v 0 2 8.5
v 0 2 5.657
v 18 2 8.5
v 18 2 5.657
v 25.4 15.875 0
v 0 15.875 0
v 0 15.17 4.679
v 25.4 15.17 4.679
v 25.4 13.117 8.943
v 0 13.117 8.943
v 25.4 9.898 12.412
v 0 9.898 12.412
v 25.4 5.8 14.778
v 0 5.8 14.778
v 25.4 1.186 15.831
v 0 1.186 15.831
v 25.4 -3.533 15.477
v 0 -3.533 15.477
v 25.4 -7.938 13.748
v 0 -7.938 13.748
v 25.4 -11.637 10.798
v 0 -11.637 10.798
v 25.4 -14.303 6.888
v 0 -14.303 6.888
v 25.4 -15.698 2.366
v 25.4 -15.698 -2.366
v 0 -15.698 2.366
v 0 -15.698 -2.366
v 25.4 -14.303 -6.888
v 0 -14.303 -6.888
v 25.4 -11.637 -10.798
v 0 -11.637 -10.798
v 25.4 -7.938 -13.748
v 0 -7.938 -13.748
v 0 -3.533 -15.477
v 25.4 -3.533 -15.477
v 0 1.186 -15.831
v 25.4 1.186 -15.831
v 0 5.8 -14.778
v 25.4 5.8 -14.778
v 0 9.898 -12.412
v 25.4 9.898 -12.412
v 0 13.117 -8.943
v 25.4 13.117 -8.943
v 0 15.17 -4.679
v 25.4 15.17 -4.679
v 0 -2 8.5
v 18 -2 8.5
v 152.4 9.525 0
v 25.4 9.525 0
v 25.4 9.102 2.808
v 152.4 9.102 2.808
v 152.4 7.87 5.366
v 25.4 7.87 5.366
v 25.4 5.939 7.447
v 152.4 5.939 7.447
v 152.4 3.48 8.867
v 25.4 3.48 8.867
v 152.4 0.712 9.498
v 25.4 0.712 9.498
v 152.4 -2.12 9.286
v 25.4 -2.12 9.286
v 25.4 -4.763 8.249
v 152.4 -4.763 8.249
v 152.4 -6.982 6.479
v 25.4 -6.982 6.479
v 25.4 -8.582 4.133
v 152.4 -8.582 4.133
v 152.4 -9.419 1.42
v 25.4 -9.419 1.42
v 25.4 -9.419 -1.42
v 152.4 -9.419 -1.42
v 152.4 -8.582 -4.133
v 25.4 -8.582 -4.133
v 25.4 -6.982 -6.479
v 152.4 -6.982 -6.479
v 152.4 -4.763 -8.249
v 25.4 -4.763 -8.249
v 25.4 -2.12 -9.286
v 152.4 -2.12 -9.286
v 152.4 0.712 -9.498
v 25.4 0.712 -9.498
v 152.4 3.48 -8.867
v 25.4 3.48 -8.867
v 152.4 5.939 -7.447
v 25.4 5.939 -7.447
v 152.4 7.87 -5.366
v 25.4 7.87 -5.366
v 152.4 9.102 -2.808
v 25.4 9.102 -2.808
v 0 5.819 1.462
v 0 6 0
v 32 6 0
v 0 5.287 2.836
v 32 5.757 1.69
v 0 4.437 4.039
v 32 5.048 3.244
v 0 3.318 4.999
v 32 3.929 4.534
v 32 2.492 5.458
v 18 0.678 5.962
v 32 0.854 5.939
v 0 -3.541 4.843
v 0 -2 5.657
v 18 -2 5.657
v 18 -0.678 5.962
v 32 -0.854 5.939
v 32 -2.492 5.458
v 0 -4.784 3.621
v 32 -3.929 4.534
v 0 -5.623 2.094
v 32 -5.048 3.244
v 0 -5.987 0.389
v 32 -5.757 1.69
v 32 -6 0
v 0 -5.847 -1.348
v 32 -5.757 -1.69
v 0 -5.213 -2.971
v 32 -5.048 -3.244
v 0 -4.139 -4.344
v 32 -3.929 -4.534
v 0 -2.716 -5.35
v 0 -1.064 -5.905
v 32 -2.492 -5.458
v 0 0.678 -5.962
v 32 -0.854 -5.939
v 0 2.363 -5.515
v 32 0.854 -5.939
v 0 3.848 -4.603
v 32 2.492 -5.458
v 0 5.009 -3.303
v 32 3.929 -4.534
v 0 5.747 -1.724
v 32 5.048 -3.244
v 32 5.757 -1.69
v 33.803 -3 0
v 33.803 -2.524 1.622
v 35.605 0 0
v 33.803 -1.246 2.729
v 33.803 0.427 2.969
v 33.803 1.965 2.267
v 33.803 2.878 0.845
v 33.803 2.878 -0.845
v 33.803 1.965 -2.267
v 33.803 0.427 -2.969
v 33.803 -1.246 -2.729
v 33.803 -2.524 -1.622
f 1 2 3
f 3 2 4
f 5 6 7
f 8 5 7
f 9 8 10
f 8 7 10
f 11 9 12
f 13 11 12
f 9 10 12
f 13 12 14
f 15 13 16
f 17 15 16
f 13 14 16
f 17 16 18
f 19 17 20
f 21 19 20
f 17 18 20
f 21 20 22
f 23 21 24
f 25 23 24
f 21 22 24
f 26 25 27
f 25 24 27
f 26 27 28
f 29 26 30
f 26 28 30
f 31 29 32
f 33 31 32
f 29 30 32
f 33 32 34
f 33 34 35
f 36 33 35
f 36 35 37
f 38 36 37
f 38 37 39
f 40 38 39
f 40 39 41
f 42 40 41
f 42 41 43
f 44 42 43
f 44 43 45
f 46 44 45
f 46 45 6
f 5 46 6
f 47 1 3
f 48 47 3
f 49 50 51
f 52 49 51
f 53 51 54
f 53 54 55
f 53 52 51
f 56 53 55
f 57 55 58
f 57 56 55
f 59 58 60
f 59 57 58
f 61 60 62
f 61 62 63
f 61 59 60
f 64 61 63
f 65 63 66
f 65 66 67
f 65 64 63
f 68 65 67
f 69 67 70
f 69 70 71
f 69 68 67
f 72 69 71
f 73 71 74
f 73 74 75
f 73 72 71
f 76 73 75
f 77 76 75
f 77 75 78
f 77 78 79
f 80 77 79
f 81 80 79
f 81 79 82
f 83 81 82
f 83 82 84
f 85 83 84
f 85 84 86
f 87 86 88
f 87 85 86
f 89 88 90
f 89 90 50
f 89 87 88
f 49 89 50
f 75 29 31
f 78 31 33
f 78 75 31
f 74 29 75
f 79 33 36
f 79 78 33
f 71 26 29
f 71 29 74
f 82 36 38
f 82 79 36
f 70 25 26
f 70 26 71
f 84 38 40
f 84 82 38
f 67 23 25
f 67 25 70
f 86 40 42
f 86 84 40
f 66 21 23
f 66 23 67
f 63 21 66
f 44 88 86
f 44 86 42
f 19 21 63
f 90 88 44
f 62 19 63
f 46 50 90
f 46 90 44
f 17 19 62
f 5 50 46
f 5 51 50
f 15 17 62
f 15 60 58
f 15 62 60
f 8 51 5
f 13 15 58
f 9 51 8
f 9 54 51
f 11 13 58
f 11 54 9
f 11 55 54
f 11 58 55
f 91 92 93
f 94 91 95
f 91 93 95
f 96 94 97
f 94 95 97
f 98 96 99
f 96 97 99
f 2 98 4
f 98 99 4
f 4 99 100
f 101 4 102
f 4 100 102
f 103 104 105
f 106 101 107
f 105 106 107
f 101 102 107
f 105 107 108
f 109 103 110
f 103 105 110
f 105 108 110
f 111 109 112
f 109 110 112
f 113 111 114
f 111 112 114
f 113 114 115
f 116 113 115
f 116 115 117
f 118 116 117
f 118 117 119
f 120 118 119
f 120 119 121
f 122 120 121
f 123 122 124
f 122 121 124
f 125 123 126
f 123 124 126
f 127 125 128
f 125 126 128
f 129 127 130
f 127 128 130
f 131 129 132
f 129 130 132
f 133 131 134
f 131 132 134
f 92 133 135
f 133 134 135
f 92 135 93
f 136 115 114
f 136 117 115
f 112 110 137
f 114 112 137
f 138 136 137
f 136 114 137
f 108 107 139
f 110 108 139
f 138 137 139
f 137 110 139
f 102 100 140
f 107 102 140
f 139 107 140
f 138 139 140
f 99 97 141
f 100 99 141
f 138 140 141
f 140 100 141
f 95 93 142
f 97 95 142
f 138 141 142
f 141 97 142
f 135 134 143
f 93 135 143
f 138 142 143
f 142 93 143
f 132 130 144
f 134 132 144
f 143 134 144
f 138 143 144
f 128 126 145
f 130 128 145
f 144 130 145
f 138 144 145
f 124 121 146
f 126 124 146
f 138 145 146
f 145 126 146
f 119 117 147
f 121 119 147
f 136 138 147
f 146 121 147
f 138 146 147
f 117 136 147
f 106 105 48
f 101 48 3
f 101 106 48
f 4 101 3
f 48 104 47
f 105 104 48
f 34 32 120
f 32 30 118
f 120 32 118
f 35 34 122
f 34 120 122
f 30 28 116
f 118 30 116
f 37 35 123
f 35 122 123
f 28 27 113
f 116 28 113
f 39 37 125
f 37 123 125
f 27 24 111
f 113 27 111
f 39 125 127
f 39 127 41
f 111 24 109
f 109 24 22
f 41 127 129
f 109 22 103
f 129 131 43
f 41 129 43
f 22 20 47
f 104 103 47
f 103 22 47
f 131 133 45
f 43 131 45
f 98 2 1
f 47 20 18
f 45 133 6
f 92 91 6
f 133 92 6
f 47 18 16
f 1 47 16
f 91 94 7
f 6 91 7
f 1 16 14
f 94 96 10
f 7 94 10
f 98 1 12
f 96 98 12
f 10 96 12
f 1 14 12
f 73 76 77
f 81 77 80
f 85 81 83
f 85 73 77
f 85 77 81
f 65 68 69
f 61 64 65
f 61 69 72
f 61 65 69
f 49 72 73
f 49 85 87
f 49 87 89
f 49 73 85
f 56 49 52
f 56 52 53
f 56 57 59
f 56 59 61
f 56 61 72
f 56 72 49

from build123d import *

# Parameters (mm, degrees)
F0_R     = 15.875
F1_DEPTH = 152.4
F3_D     = 12
F3_DEPTH = 32
F3_TIP   = 3.6051637142
F4_W     = 18
F4_H     = 4
F5_DEPTH = 8.5
F6_R     = 15.875
F6_R_2   = 9.525
F7_DEPTH = 127


with BuildPart() as f1:
    # F0 (on Right) → F1 (new body)
    with BuildSketch(Plane.YZ):
        Circle(F0_R)
    extrude(amount=F1_DEPTH)

    # F3
    with Locations(Plane(origin=(0, 0, 0), x_dir=(0, -1, 0), z_dir=(-1, 0, 0))):
        with Locations((0, 0)):
            Hole(F3_D / 2, depth=F3_DEPTH)
            with Locations((0, 0, -(F3_DEPTH + F3_TIP / 2))):  # 118° drill point
                Cone(0, F3_D / 2, F3_TIP, mode=Mode.SUBTRACT)

    # F4 (on Top) → F5 (cut)
    with BuildSketch(Plane.XY):
        with Locations((9, 0)):
            Rectangle(F4_W, F4_H)
    extrude(amount=F5_DEPTH, mode=Mode.SUBTRACT)

    # F6 (on face) → F7 (cut)
    with BuildSketch(Plane.YZ.offset(152.4)):
        Circle(F6_R)
        Circle(F6_R_2, mode=Mode.SUBTRACT)
    extrude(amount=-F7_DEPTH, mode=Mode.SUBTRACT)


solid = f1.part
